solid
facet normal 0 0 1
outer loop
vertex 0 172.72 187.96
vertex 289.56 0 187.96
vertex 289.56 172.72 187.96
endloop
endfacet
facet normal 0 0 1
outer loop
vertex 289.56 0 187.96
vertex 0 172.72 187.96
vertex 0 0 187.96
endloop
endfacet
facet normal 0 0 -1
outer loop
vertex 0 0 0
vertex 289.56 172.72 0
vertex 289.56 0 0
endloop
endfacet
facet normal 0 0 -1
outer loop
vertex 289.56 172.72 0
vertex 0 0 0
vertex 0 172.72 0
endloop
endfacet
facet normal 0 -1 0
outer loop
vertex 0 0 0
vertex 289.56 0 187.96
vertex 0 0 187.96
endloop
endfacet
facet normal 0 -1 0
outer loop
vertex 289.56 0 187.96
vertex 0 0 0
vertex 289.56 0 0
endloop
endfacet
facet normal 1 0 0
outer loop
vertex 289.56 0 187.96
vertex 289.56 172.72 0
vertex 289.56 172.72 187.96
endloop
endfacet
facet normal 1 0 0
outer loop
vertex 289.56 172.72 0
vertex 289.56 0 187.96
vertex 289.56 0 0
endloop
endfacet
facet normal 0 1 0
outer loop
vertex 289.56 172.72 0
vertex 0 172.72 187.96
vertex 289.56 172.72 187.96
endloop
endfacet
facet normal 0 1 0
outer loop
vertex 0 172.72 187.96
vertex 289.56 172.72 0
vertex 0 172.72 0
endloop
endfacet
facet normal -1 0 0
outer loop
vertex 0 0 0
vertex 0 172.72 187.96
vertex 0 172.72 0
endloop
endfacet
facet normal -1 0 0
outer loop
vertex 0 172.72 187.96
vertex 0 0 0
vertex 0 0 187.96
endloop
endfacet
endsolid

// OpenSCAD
// file: ../lib/colors.scad
module color_wood() {
  color("#f2ba52")
    children();
}

module color_hdpe() {
  color("#ccd")
    children();
}

module color_steel() {
  color("#888")
    children();
}

module color_white() {
  color("#fafafa")
    children();
}

module color_black() {
  color("#333")
    children();
}
// file: ../lib/convert.scad
function inches(in) = in * 25.4;
function feet(ft) = inches(ft * 12);
// main file
use <../lib/convert.scad>
use <../lib/colors.scad>

module battery() {
  color_black()
    cube([inches(11.4), inches(6.8), inches(7.4)]);
}

battery();
